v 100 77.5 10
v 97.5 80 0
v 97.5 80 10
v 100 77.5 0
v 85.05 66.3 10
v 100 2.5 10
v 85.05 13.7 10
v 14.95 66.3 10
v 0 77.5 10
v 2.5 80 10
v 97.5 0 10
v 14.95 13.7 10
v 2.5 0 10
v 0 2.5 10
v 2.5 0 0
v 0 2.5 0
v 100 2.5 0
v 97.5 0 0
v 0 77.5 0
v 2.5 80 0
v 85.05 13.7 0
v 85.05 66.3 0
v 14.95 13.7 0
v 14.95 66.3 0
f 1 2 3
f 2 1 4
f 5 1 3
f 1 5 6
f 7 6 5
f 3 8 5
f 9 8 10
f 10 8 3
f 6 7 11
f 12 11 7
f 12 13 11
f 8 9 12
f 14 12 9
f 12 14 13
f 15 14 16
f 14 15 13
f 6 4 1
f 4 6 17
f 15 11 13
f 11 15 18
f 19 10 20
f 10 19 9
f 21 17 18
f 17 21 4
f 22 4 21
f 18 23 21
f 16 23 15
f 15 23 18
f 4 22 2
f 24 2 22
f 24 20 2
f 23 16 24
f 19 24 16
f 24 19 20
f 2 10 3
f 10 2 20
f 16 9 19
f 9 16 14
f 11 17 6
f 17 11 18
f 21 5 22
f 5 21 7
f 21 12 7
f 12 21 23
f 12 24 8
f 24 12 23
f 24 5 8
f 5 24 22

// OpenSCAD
$fn = 32;

// ----------------------------------------------------------------------
// Windowed plate: 1 voids, 100 x 80 x 10 mm
// ----------------------------------------------------------------------

// --- parameters (mm) ---
plate_l = 100;            // plate length, X
plate_w = 80;             // plate width, Y
plate_t = 10;             // plate thickness, Z
edge_margin = 10;         // wall from the plate edge to any window
win1_l = 70.1;            // window length
win1_w = 52.6;            // window width
depth_1 = 10;             // depth of void 1 (full thickness = through)
corner_c = 2.5;           // corner chamfer of the plate

profile = [[2.5, 0], [97.5, 0], [100, 2.5], [100, 77.5], [97.5, 80], [2.5, 80], [0, 77.5], [0, 2.5]];  // primary outline, 8 points, counter clockwise
void_1 = [[14.95, 13.7], [85.05, 13.7], [85.05, 66.3], [14.95, 66.3]];  // large central window, 4 points

// --- the one profile operation ---
difference() {
  linear_extrude(height = plate_t) polygon(points = profile);
  translate([0, 0, -1])
    linear_extrude(height = plate_t + 2) polygon(points = void_1);
}
